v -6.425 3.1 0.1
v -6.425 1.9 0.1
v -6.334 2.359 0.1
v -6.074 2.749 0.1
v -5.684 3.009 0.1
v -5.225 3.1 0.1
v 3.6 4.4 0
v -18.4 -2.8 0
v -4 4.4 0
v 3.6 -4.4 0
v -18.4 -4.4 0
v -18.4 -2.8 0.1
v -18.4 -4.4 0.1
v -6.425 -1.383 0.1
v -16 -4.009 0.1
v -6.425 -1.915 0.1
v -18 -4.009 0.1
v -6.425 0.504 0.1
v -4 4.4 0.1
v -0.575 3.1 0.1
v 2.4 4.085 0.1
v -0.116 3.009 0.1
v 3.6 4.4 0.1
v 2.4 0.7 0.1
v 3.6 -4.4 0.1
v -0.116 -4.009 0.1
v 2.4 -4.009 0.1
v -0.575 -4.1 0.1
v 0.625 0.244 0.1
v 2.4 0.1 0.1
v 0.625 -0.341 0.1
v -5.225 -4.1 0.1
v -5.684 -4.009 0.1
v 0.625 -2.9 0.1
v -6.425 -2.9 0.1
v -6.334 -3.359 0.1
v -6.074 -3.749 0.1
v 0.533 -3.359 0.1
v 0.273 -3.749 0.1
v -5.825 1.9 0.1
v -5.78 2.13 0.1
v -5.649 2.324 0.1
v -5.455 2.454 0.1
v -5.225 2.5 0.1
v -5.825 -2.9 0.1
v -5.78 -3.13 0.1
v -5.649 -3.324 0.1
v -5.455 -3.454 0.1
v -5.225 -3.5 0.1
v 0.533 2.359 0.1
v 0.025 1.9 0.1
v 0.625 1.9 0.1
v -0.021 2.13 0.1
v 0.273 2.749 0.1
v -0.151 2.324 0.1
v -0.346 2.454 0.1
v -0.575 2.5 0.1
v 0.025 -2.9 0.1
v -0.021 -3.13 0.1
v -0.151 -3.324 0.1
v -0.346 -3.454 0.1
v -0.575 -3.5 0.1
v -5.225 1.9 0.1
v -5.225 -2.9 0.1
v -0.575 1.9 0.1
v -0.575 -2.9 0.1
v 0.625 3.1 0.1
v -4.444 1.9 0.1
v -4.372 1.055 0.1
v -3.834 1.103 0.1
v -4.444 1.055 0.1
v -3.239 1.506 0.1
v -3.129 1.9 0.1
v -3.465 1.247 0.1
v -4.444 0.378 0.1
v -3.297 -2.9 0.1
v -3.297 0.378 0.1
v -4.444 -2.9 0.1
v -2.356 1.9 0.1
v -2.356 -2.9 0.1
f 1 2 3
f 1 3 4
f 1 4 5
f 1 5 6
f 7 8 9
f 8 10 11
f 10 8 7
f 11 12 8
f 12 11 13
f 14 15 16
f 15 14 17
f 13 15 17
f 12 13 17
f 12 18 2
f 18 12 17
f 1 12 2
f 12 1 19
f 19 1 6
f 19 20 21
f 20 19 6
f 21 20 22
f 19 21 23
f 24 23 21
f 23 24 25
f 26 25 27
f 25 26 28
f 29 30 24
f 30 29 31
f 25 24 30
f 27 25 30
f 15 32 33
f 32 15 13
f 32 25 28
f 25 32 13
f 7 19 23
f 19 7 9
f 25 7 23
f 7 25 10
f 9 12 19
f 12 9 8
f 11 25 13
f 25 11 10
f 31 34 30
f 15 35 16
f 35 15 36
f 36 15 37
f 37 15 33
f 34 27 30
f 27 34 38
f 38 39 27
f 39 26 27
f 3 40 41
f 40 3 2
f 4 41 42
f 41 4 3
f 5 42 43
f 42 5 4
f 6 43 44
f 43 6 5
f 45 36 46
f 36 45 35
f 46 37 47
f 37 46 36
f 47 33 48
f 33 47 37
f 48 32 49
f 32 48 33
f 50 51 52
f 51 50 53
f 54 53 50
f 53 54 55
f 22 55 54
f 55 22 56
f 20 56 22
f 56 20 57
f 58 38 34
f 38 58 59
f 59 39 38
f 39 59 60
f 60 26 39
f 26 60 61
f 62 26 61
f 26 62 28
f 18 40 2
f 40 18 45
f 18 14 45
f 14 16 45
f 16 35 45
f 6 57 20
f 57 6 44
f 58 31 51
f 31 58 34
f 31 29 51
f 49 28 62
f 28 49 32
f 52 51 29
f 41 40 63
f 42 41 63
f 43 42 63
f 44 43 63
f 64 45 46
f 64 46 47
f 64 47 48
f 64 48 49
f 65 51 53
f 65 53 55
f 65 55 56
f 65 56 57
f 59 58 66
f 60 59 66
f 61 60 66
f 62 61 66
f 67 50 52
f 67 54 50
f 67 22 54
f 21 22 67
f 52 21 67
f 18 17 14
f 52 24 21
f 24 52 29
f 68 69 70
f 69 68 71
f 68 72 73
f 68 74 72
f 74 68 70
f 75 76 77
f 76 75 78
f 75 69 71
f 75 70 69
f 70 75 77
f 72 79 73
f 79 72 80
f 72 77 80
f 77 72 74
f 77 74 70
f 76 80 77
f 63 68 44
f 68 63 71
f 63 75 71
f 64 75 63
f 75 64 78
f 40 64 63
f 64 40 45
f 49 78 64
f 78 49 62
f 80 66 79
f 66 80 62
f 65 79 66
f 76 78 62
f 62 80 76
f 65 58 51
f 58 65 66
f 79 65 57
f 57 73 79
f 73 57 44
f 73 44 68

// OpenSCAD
// file: ../p/1-4ndis.scad
use <../lib.scad>
function ldraw_lib__1_4ndis() = [
// 0 Disc Negative 0.25
// 0 Name: 1-4ndis.dat
// 0 Author: James Jessiman
// 0 !LDRAW_ORG Primitive UPDATE 2012-01
// 0 !LICENSE Licensed under CC BY 2.0 and CC BY 4.0 : see CAreadme.txt
// 
// 0 BFC CERTIFY CCW
  [0,"BFC","CERTIFY"],
  [0,"BFC","CCW"],
// 
// 0 !HISTORY 2002-03-23 [sbliss] Added BFC Statement
// 0 !HISTORY 2002-04-25 [PTadmin] Official Update 2002-02
// 0 !HISTORY 2007-06-22 [PTadmin] Header formatted for Contributor Agreement
// 0 !HISTORY 2008-07-01 [PTadmin] Official Update 2008-01
// 0 !HISTORY 2012-02-16 [Philo] Changed to CCW
// 0 !HISTORY 2012-03-30 [PTadmin] Official Update 2012-01
// 
// 
// 3 16 0.9239 0 0.3827 1 0 0 1 0 1
  [3,16,0.9239,0,0.3827,1,0,0,1,0,1],
// 3 16 0.7071 0 0.7071 0.9239 0 0.3827 1 0 1
  [3,16,0.7071,0,0.7071,0.9239,0,0.3827,1,0,1],
// 3 16 0.3827 0 0.9239 0.7071 0 0.7071 1 0 1
  [3,16,0.3827,0,0.9239,0.7071,0,0.7071,1,0,1],
// 3 16 0 0 1 0.3827 0 0.9239 1 0 1
  [3,16,0,0,1,0.3827,0,0.9239,1,0,1],
];
module ldraw_lib__1_4ndis(step=0, col=false, unit=2/5, alt=false, line=0.2, solid=!$preview)
    makepoly(ldraw_lib__1_4ndis(), step=step, col=col, unit=unit, alt=alt, line=line, solid=solid);
ldraw_lib__1_4ndis(line=0.2);
// file: ../p/3-16ndis.scad
use <../lib.scad>
function ldraw_lib__3_16ndis() = [
// 0 Disc Negative 0.1875
// 0 Name: 3-16ndis.dat
// 0 Author: Guy Vivan [guyvivan]
// 0 !LDRAW_ORG Primitive UPDATE 2009-01
// 0 !LICENSE Licensed under CC BY 2.0 and CC BY 4.0 : see CAreadme.txt
// 
// 0 BFC CERTIFY CCW
  [0,"BFC","CERTIFY"],
  [0,"BFC","CCW"],
// 
// 0 !HISTORY 2009-05-02 [PTadmin] Official Update 2009-01
// 
// 
// 3 16 1 0 1 0.9239 0 0.3827 1 0 0
  [3,16,1,0,1,0.9239,0,0.3827,1,0,0],
// 3 16 1 0 1 0.7071 0 0.7071 0.9239 0 0.3827
  [3,16,1,0,1,0.7071,0,0.7071,0.9239,0,0.3827],
// 3 16 1 0 1 0.3827 0 0.9239 0.7071 0 0.7071
  [3,16,1,0,1,0.3827,0,0.9239,0.7071,0,0.7071],
// 
// 0 end of file
// 
];
module ldraw_lib__3_16ndis(step=0, col=false, unit=2/5, alt=false, line=0.2, solid=!$preview)
    makepoly(ldraw_lib__3_16ndis(), step=step, col=col, unit=unit, alt=alt, line=line, solid=solid);
ldraw_lib__3_16ndis(line=0.2);
// file: ../p/1-4ring1.scad
use <../lib.scad>
function ldraw_lib__1_4ring1() = [
// 0 Ring  1 x 0.25
// 0 Name: 1-4ring1.dat
// 0 Author: Chris Dee [cwdee]
// 0 !LDRAW_ORG Primitive UPDATE 2012-01
// 0 !LICENSE Licensed under CC BY 2.0 and CC BY 4.0 : see CAreadme.txt
// 
// 0 BFC CERTIFY CCW
  [0,"BFC","CERTIFY"],
  [0,"BFC","CCW"],
// 
// 0 !HISTORY 2000-05-07 [PTadmin] Official Update 2000-01
// 0 !HISTORY 2002-11-22 [hafhead] Added BFC statement
// 0 !HISTORY 2002-11-30 [PTadmin] Official Update 2002-05
// 0 !HISTORY 2007-06-22 [PTadmin] Header formatted for Contributor Agreement
// 0 !HISTORY 2008-07-01 [PTadmin] Official Update 2008-01
// 0 !HISTORY 2012-02-16 [Philo] Changed to CCW
// 0 !HISTORY 2012-03-30 [PTadmin] Official Update 2012-01
// 
// 
// 4 16 2 0 0 1.8478 0 0.7654 0.9239 0 0.3827 1 0 0
  [4,16,2,0,0,1.8478,0,0.7654,0.9239,0,0.3827,1,0,0],
// 4 16 1.8478 0 0.7654 1.4142 0 1.4142 0.7071 0 0.7071 0.9239 0 0.3827
  [4,16,1.8478,0,0.7654,1.4142,0,1.4142,0.7071,0,0.7071,0.9239,0,0.3827],
// 4 16 1.4142 0 1.4142 0.7654 0 1.8478 0.3827 0 0.9239 0.7071 0 0.7071
  [4,16,1.4142,0,1.4142,0.7654,0,1.8478,0.3827,0,0.9239,0.7071,0,0.7071],
// 4 16 0.7654 0 1.8478 0 0 2 0 0 1 0.3827 0 0.9239
  [4,16,0.7654,0,1.8478,0,0,2,0,0,1,0.3827,0,0.9239],
];
module ldraw_lib__1_4ring1(step=0, col=false, unit=2/5, alt=false, line=0.2, solid=!$preview)
    makepoly(ldraw_lib__1_4ring1(), step=step, col=col, unit=unit, alt=alt, line=line, solid=solid);
ldraw_lib__1_4ring1(line=0.2);
// file: ../p/1-4disc.scad
use <../lib.scad>
function ldraw_lib__1_4disc() = [
// 0 Disc 0.25
// 0 Name: 1-4disc.dat
// 0 Author: James Jessiman
// 0 !LDRAW_ORG Primitive UPDATE 2002-02
// 0 !LICENSE Licensed under CC BY 2.0 and CC BY 4.0 : see CAreadme.txt
// 
// 0 BFC CERTIFY CCW
  [0,"BFC","CERTIFY"],
  [0,"BFC","CCW"],
// 
// 0 !HISTORY 2002-03-23 [sbliss] Added BFC statement.
// 0 !HISTORY 2002-04-25 [PTadmin] Official Update 2002-02
// 0 !HISTORY 2007-06-22 [PTadmin] Header formatted for Contributor Agreement
// 0 !HISTORY 2008-07-01 [PTadmin] Official Update 2008-01
// 
// 
// 3 16 0 0 0 1 0 0 0.9239 0 0.3827
  [3,16,0,0,0,1,0,0,0.9239,0,0.3827],
// 3 16 0 0 0 0.9239 0 0.3827 0.7071 0 0.7071
  [3,16,0,0,0,0.9239,0,0.3827,0.7071,0,0.7071],
// 3 16 0 0 0 0.7071 0 0.7071 0.3827 0 0.9239
  [3,16,0,0,0,0.7071,0,0.7071,0.3827,0,0.9239],
// 3 16 0 0 0 0.3827 0 0.9239 0 0 1
  [3,16,0,0,0,0.3827,0,0.9239,0,0,1],
// 0
];
module ldraw_lib__1_4disc(step=0, col=false, unit=2/5, alt=false, line=0.2, solid=!$preview)
    makepoly(ldraw_lib__1_4disc(), step=step, col=col, unit=unit, alt=alt, line=line, solid=solid);
ldraw_lib__1_4disc(line=0.2);
// file: ../p/type-swiss721bt-bold-n1.scad
use <../lib.scad>
function ldraw_lib__type_swiss721bt_bold_n1() = [
// 0 Type Swiss721BT Number "1" Bold
// 0 Name: type-swiss721bt-bold-n1.dat
// 0 Author: Ulrich Röder [UR]
// 0 !LDRAW_ORG Primitive UPDATE 2019-01
// 0 !LICENSE Licensed under CC BY 2.0 and CC BY 4.0 : see CAreadme.txt
// 
// 0 BFC CERTIFY CCW
  [0,"BFC","CERTIFY"],
  [0,"BFC","CCW"],
// 
// 0 !HISTORY 2019-06-28 [PTadmin] Official Update 2019-01
// 
// 
// 0 // Main
// 4 16 -.2175 0 .324 -.2025 0 .324 -.0905 0 .334 -.2175 0 .5
  [4,16,-.2175,0,.324,-.2025,0,.324,-.0905,0,.334,-.2175,0,.5],
// 3 16 -.2175 0 .5 .0335 0 .418 .0565 0 .5
  [3,16,-.2175,0,.5,.0335,0,.418,.0565,0,.5],
// 4 16 .0335 0 .418 -.2175 0 .5 -.0905 0 .334 -.0135 0 .364
  [4,16,.0335,0,.418,-.2175,0,.5,-.0905,0,.334,-.0135,0,.364],
// 4 16 .0215 0 .183 -.2175 0 .183 -.2175 0 -.5 .0215 0 -.5
  [4,16,.0215,0,.183,-.2175,0,.183,-.2175,0,-.5,.0215,0,-.5],
// 
// 0 // Black
// 3 0 -.2175 0 .183 -.2025 0 .324 -.2175 0 .324
  [3,0,-.2175,0,.183,-.2025,0,.324,-.2175,0,.324],
// 4 0 .0215 0 .183 -.0905 0 .334 -.2025 0 .324 -.2175 0 .183
  [4,0,.0215,0,.183,-.0905,0,.334,-.2025,0,.324,-.2175,0,.183],
// 4 0 .0335 0 .418 .2175 0 -.5 .2175 0 .5 .0565 0 .5
  [4,0,.0335,0,.418,.2175,0,-.5,.2175,0,.5,.0565,0,.5],
// 4 0 .0215 0 .183 .2175 0 -.5 .0335 0 .418 -.0135 0 .364
  [4,0,.0215,0,.183,.2175,0,-.5,.0335,0,.418,-.0135,0,.364],
// 3 0 .0215 0 .183 -.0135 0 .364 -.0905 0 .334
  [3,0,.0215,0,.183,-.0135,0,.364,-.0905,0,.334],
// 3 0 .0215 0 -.5 .2175 0 -.5 .0215 0 .183
  [3,0,.0215,0,-.5,.2175,0,-.5,.0215,0,.183],
];
module ldraw_lib__type_swiss721bt_bold_n1(step=0, col=false, unit=2/5, alt=false, line=0.2, solid=!$preview)
    makepoly(ldraw_lib__type_swiss721bt_bold_n1(), step=step, col=col, unit=unit, alt=alt, line=line, solid=solid);
ldraw_lib__type_swiss721bt_bold_n1(line=0.2);
// file: s/821435as03.scad
use <../../lib.scad>
use <../../p/1-4ndis.scad>
function ldraw_lib__s__821435as03() = [
// 0 ~Sticker Sloped Body for Racing Number
// 0 Name: s\821435as03.dat
// 0 Author: Ulrich Röder [UR]
// 0 !LDRAW_ORG Subpart UPDATE 2019-01
// 0 !LICENSE Licensed under CC BY 2.0 and CC BY 4.0 : see CAreadme.txt
// 
// 0 BFC CERTIFY CCW
  [0,"BFC","CERTIFY"],
  [0,"BFC","CCW"],
// 
// 0 !HISTORY 2019-06-28 [PTadmin] Official Update 2019-01
// 
// 
// 0 // Main
// 1 16 13.063 -.25 4.75 3 0 0 0 1 0 0 0 3 1-4ndis.dat
  [1,16,13.063,-.25,4.75,3,0,0,0,1,0,0,0,3, ldraw_lib__1_4ndis()],
// 3 16 10 0 11 46 0 -7 -9 0 11
  [3,16,10,0,11,46,0,-7,-9,0,11],
// 4 16 -9 0 -11 -9 0 11 46 0 -7 46 0 -11
  [4,16,-9,0,-11,-9,0,11,46,0,-7,46,0,-11],
// 4 16 46 -.25 -11 46 0 -11 46 0 -7 46 -.25 -7
  [4,16,46,-.25,-11,46,0,-11,46,0,-7,46,-.25,-7],
// 4 16 16.063 -.25 -4.788 40 -.25 -10.022 45 -.25 -10.022 16.063 -.25 -3.458
  [4,16,16.063,-.25,-4.788,40,-.25,-10.022,45,-.25,-10.022,16.063,-.25,-3.458],
// 3 16 45 -.25 -10.022 40 -.25 -10.022 46 -.25 -11
  [3,16,45,-.25,-10.022,40,-.25,-10.022,46,-.25,-11],
// 3 16 45 -.25 -10.022 46 -.25 -11 46 -.25 -7
  [3,16,45,-.25,-10.022,46,-.25,-11,46,-.25,-7],
// 4 16 16.063 -.25 4.75 16.063 -.25 1.261 45 -.25 -10.022 46 -.25 -7
  [4,16,16.063,-.25,4.75,16.063,-.25,1.261,45,-.25,-10.022,46,-.25,-7],
// 3 16 16.063 -.25 4.75 46 -.25 -7 16.063 -.25 7.75
  [3,16,16.063,-.25,4.75,46,-.25,-7,16.063,-.25,7.75],
// 3 16 10 -.25 11 16.063 -.25 7.75 46 -.25 -7
  [3,16,10,-.25,11,16.063,-.25,7.75,46,-.25,-7],
// 3 16 13.063 -.25 7.75 16.063 -.25 7.75 10 -.25 11
  [3,16,13.063,-.25,7.75,16.063,-.25,7.75,10,-.25,11],
// 4 16 -6 -.25 10.213 1.438 -.25 7.75 13.063 -.25 7.75 10 -.25 11
  [4,16,-6,-.25,10.213,1.438,-.25,7.75,13.063,-.25,7.75,10,-.25,11],
// 3 16 .2899 -.25 7.5217 1.438 -.25 7.75 -6 -.25 10.213
  [3,16,.2899,-.25,7.5217,1.438,-.25,7.75,-6,-.25,10.213],
// 3 16 -9 -.25 11 -6 -.25 10.213 10 -.25 11
  [3,16,-9,-.25,11,-6,-.25,10.213,10,-.25,11],
// 4 16 -9 -.25 -11 -6 -.25 1.75 -6 -.25 10.213 -9 -.25 11
  [4,16,-9,-.25,-11,-6,-.25,1.75,-6,-.25,10.213,-9,-.25,11],
// 4 16 1.438 -.25 -10.25 .2899 -.25 -10.0217 -6 -.25 -10.022 -9 -.25 -11
  [4,16,1.438,-.25,-10.25,.2899,-.25,-10.0217,-6,-.25,-10.022,-9,-.25,-11],
// 4 16 -1.563 -.25 .61 -6 -.25 1.75 -6 -.25 .25 -1.563 -.25 -.853
  [4,16,-1.563,-.25,.61,-6,-.25,1.75,-6,-.25,.25,-1.563,-.25,-.853],
// 3 16 -6 -.25 .25 -6 -.25 1.75 -9 -.25 -11
  [3,16,-6,-.25,.25,-6,-.25,1.75,-9,-.25,-11],
// 3 16 -6 -.25 .25 -9 -.25 -11 -6 -.25 -10.022
  [3,16,-6,-.25,.25,-9,-.25,-11,-6,-.25,-10.022],
// 4 16 40 -.25 -10.022 14.2111 -.25 -10.0217 13.063 -.25 -10.25 46 -.25 -11
  [4,16,40,-.25,-10.022,14.2111,-.25,-10.0217,13.063,-.25,-10.25,46,-.25,-11],
// 4 16 1.438 -.25 -10.25 -9 -.25 -11 46 -.25 -11 13.063 -.25 -10.25
  [4,16,1.438,-.25,-10.25,-9,-.25,-11,46,-.25,-11,13.063,-.25,-10.25],
// 4 16 -9 -.25 11 10 -.25 11 10 0 11 -9 0 11
  [4,16,-9,-.25,11,10,-.25,11,10,0,11,-9,0,11],
// 4 16 -9 0 11 -9 0 -11 -9 -.25 -11 -9 -.25 11
  [4,16,-9,0,11,-9,0,-11,-9,-.25,-11,-9,-.25,11],
// 4 16 10 -.25 11 46 -.25 -7 46 0 -7 10 0 11
  [4,16,10,-.25,11,46,-.25,-7,46,0,-7,10,0,11],
// 4 16 46 0 -11 46 -.25 -11 -9 -.25 -11 -9 0 -11
  [4,16,46,0,-11,46,-.25,-11,-9,-.25,-11,-9,0,-11],
];
module ldraw_lib__s__821435as03(step=0, col=false, unit=2/5, alt=false, line=0.2, solid=!$preview)
    makepoly(ldraw_lib__s__821435as03(), step=step, col=col, unit=unit, alt=alt, line=line, solid=solid);
ldraw_lib__s__821435as03(line=0.2);
// file: s/821435as02.scad
use <../../lib.scad>
use <../../p/3-16ndis.scad>
function ldraw_lib__s__821435as02() = [
// 0 ~Sticker Upper Triangle with Cutout for Racing Number
// 0 Name: s\821435as02.dat
// 0 Author: Ulrich Röder [UR]
// 0 !LDRAW_ORG Subpart UPDATE 2019-01
// 0 !LICENSE Licensed under CC BY 2.0 and CC BY 4.0 : see CAreadme.txt
// 
// 0 BFC CERTIFY CCW
  [0,"BFC","CERTIFY"],
  [0,"BFC","CCW"],
// 
// 0 !HISTORY 2019-06-28 [PTadmin] Official Update 2019-01
// 
// 
// 0 // Main
// 1 16 1.438 -.25 4.75 -3 0 0 0 1 0 0 0 3 3-16ndis.dat
  [1,16,1.438,-.25,4.75,-3,0,0,0,1,0,0,0,3, ldraw_lib__3_16ndis()],
// 3 16 -1.562 -.25 7.75 .2899 -.25 7.5217 -6 -.25 10.213
  [3,16,-1.562,-.25,7.75,.2899,-.25,7.5217,-6,-.25,10.213],
// 3 16 -1.562 -.25 7.75 -6 -.25 10.213 -1.562 -.25 4.75
  [3,16,-1.562,-.25,7.75,-6,-.25,10.213,-1.562,-.25,4.75],
// 3 16 16.063 -.25 -3.458 45 -.25 -10.022 16.063 -.25 1.261
  [3,16,16.063,-.25,-3.458,45,-.25,-10.022,16.063,-.25,1.261],
// 4 16 -6 -.25 1.75 -1.563 -.25 .61 -1.562 -.25 4.75 -6 -.25 10.213
  [4,16,-6,-.25,1.75,-1.563,-.25,.61,-1.562,-.25,4.75,-6,-.25,10.213],
];
module ldraw_lib__s__821435as02(step=0, col=false, unit=2/5, alt=false, line=0.2, solid=!$preview)
    makepoly(ldraw_lib__s__821435as02(), step=step, col=col, unit=unit, alt=alt, line=line, solid=solid);
ldraw_lib__s__821435as02(line=0.2);
// file: s/821435as01.scad
use <../../lib.scad>
use <../../p/1-4disc.scad>
use <../../p/1-4ring1.scad>
function ldraw_lib__s__821435as01() = [
// 0 ~Sticker Lower Triangle and Racing Number Frame
// 0 Name: s\821435as01.dat
// 0 Author: Ulrich Röder [UR]
// 0 !LDRAW_ORG Subpart UPDATE 2019-01
// 0 !LICENSE Licensed under CC BY 2.0 and CC BY 4.0 : see CAreadme.txt
// 
// 0 BFC CERTIFY CCW
  [0,"BFC","CERTIFY"],
  [0,"BFC","CCW"],
// 
// 0 !HISTORY 2019-06-28 [PTadmin] Official Update 2019-01
// 
// 
// 0 // Main
// 
// 3 16 -6 -0.25 0.25 -1.562 -0.25 -7.25 -1.563 -0.25 -0.853
  [3,16,-6,-0.25,0.25,-1.562,-0.25,-7.25,-1.563,-0.25,-0.853],
// 3 16 16.063 -0.25 -4.788 16.063 -0.25 -7.25 40 -0.25 -10.022
  [3,16,16.063,-0.25,-4.788,16.063,-0.25,-7.25,40,-0.25,-10.022],
// 3 16 15.8347 -0.25 -8.3981 40 -0.25 -10.022 16.063 -0.25 -7.25
  [3,16,15.8347,-0.25,-8.3981,40,-0.25,-10.022,16.063,-0.25,-7.25],
// 3 16 15.1843 -0.25 -9.3713 40 -0.25 -10.022 15.8347 -0.25 -8.3981
  [3,16,15.1843,-0.25,-9.3713,40,-0.25,-10.022,15.8347,-0.25,-8.3981],
// 3 16 14.2111 -0.25 -10.0217 40 -0.25 -10.022 15.1843 -0.25 -9.3713
  [3,16,14.2111,-0.25,-10.0217,40,-0.25,-10.022,15.1843,-0.25,-9.3713],
// 4 16 -6 -0.25 0.25 -6 -0.25 -10.022 -1.3337 -0.25 -8.3981 -1.562 -0.25 -7.25
  [4,16,-6,-0.25,0.25,-6,-0.25,-10.022,-1.3337,-0.25,-8.3981,-1.562,-0.25,-7.25],
// 3 16 -6 -0.25 -10.022 -0.6833 -0.25 -9.3713 -1.3337 -0.25 -8.3981
  [3,16,-6,-0.25,-10.022,-0.6833,-0.25,-9.3713,-1.3337,-0.25,-8.3981],
// 3 16 -6 -0.25 -10.022 0.2899 -0.25 -10.0217 -0.6833 -0.25 -9.3713
  [3,16,-6,-0.25,-10.022,0.2899,-0.25,-10.0217,-0.6833,-0.25,-9.3713],
// 
// 0 // Black
// 1 0 13.063 -.25 4.75 1.5 0 0 0 1 0 0 0 1.5 1-4ring1.dat
  [1,0,13.063,-.25,4.75,1.5,0,0,0,1,0,0,0,1.5, ldraw_lib__1_4ring1()],
// 1 0 13.063 -.25 -7.25 1.5 0 0 0 1 0 0 0 -1.5 1-4ring1.dat
  [1,0,13.063,-.25,-7.25,1.5,0,0,0,1,0,0,0,-1.5, ldraw_lib__1_4ring1()],
// 1 0 1.438 -.25 4.75 -1.5 0 0 0 1 0 0 0 1.5 1-4ring1.dat
  [1,0,1.438,-.25,4.75,-1.5,0,0,0,1,0,0,0,1.5, ldraw_lib__1_4ring1()],
// 1 0 1.438 -.25 -7.25 -1.5 0 0 0 1 0 0 0 -1.5 1-4ring1.dat
  [1,0,1.438,-.25,-7.25,-1.5,0,0,0,1,0,0,0,-1.5, ldraw_lib__1_4ring1()],
// 4 0 14.563 -0.25 4.75 14.563 -0.25 -7.25 16.063 -0.25 1.261 16.063 -0.25 4.75
  [4,0,14.563,-0.25,4.75,14.563,-0.25,-7.25,16.063,-0.25,1.261,16.063,-0.25,4.75],
// 3 0 14.563 -0.25 -7.25 16.063 -0.25 -3.458 16.063 -0.25 1.261
  [3,0,14.563,-0.25,-7.25,16.063,-0.25,-3.458,16.063,-0.25,1.261],
// 3 0 14.563 -0.25 -7.25 16.063 -0.25 -4.788 16.063 -0.25 -3.458
  [3,0,14.563,-0.25,-7.25,16.063,-0.25,-4.788,16.063,-0.25,-3.458],
// 3 0 14.563 -0.25 -7.25 16.063 -0.25 -7.25 16.063 -0.25 -4.788
  [3,0,14.563,-0.25,-7.25,16.063,-0.25,-7.25,16.063,-0.25,-4.788],
// 4 0 13.063 -0.25 6.25 13.063 -0.25 7.75 1.438 -0.25 7.75 1.438 -0.25 6.25
  [4,0,13.063,-0.25,6.25,13.063,-0.25,7.75,1.438,-0.25,7.75,1.438,-0.25,6.25],
// 4 0 -0.062 -0.25 4.75 -1.563 -0.25 -0.853 -1.562 -0.25 -7.25 -0.062 -0.25 -7.25
  [4,0,-0.062,-0.25,4.75,-1.563,-0.25,-0.853,-1.562,-0.25,-7.25,-0.062,-0.25,-7.25],
// 3 0 -0.062 -0.25 4.75 -1.563 -0.25 0.61 -1.563 -0.25 -0.853
  [3,0,-0.062,-0.25,4.75,-1.563,-0.25,0.61,-1.563,-0.25,-0.853],
// 4 0 1.438 -0.25 -10.25 13.063 -0.25 -10.25 13.063 -0.25 -8.75 1.438 -0.25 -8.75
  [4,0,1.438,-0.25,-10.25,13.063,-0.25,-10.25,13.063,-0.25,-8.75,1.438,-0.25,-8.75],
// 3 0 -1.563 -0.25 0.61 -0.062 -0.25 4.75 -1.562 -0.25 4.75
  [3,0,-1.563,-0.25,0.61,-0.062,-0.25,4.75,-1.562,-0.25,4.75],
// 
// 0 // White
// 1 15 13.063 -.25 4.75 1.5 0 0 0 1 0 0 0 1.5 1-4disc.dat
  [1,15,13.063,-.25,4.75,1.5,0,0,0,1,0,0,0,1.5, ldraw_lib__1_4disc()],
// 1 15 13.063 -.25 -7.25 1.5 0 0 0 1 0 0 0 -1.5 1-4disc.dat
  [1,15,13.063,-.25,-7.25,1.5,0,0,0,1,0,0,0,-1.5, ldraw_lib__1_4disc()],
// 1 15 1.438 -.25 4.75 -1.5 0 0 0 1 0 0 0 1.5 1-4disc.dat
  [1,15,1.438,-.25,4.75,-1.5,0,0,0,1,0,0,0,1.5, ldraw_lib__1_4disc()],
// 1 15 1.438 -.25 -7.25 -1.5 0 0 0 1 0 0 0 -1.5 1-4disc.dat
  [1,15,1.438,-.25,-7.25,-1.5,0,0,0,1,0,0,0,-1.5, ldraw_lib__1_4disc()],
];
module ldraw_lib__s__821435as01(step=0, col=false, unit=2/5, alt=false, line=0.2, solid=!$preview)
    makepoly(ldraw_lib__s__821435as01(), step=step, col=col, unit=unit, alt=alt, line=line, solid=solid);
ldraw_lib__s__821435as01(line=0.2);
// main file
use <../lib.scad>
use <s/821435as01.scad>
use <s/821435as02.scad>
use <s/821435as03.scad>
use <../p/type-swiss721bt-bold-n1.scad>
function ldraw_lib__821435b() = [
// 0 Sticker with Red/Green Triangles and Racing Number "1", Left
// 0 Name: 821435b.dat
// 0 Author: Ulrich Röder [UR]
// 0 !LDRAW_ORG Part UPDATE 2019-01
// 0 !LICENSE Licensed under CC BY 2.0 and CC BY 4.0 : see CAreadme.txt
// 
// 0 BFC CERTIFY CCW
  [0,"BFC","CERTIFY"],
  [0,"BFC","CCW"],
// 
// 0 !KEYWORDS cup, Racers, Set 6539
// 
// 0 !HISTORY 2019-06-28 [PTadmin] Official Update 2019-01
// 
// 
// 0 // Main
// 1 16 0 0 0 -1 0 0 0 1 0 0 0 1 s\821435as03.dat
  [1,16,0,0,0,-1,0,0,0,1,0,0,0,1, ldraw_lib__s__821435as03()],
// 
// 0 // Green
// 1 2 0 0 0 -1 0 0 0 1 0 0 0 1 s\821435as01.dat
  [1,2,0,0,0,-1,0,0,0,1,0,0,0,1, ldraw_lib__s__821435as01()],
// 
// 0 // Red
// 1 4 0 0 0 -1 0 0 0 1 0 0 0 1 s\821435as02.dat
  [1,4,0,0,0,-1,0,0,0,1,0,0,0,1, ldraw_lib__s__821435as02()],
// 
// 0 // White
// 1 15 -8.5 -.25 -1.25 12 0 0 0 1 0 0 0 12 type-swiss721bt-bold-n1.dat
  [1,15,-8.5,-.25,-1.25,12,0,0,0,1,0,0,0,12, ldraw_lib__type_swiss721bt_bold_n1()],
// 4 15 -11.11 -.25 2.638 -11.11 -.25 4.75 -13.063 -.25 6.25 -13.063 -.25 4.75
  [4,15,-11.11,-.25,2.638,-11.11,-.25,4.75,-13.063,-.25,6.25,-13.063,-.25,4.75],
// 3 15 -13.063 -.25 4.75 -11.11 -.25 .946 -11.11 -.25 2.638
  [3,15,-13.063,-.25,4.75,-11.11,-.25,.946,-11.11,-.25,2.638],
// 4 15 -13.063 -.25 -7.25 -11.11 -.25 -7.25 -11.11 -.25 .946 -13.063 -.25 4.75
  [4,15,-13.063,-.25,-7.25,-11.11,-.25,-7.25,-11.11,-.25,.946,-13.063,-.25,4.75],
// 4 15 -14.563 -.25 -7.25 -13.063 -.25 -7.25 -13.063 -.25 4.75 -14.563 -.25 4.75
  [4,15,-14.563,-.25,-7.25,-13.063,-.25,-7.25,-13.063,-.25,4.75,-14.563,-.25,4.75],
// 4 15 -13.063 -.25 -8.75 -1.438 -.25 -8.75 -11.11 -.25 -7.25 -13.063 -.25 -7.25
  [4,15,-13.063,-.25,-8.75,-1.438,-.25,-8.75,-11.11,-.25,-7.25,-13.063,-.25,-7.25],
// 4 15 -5.89 -.25 -7.25 -1.438 -.25 -8.75 -1.438 -.25 -7.25 -5.89 -.25 4.75
  [4,15,-5.89,-.25,-7.25,-1.438,-.25,-8.75,-1.438,-.25,-7.25,-5.89,-.25,4.75],
// 3 15 -1.438 -.25 4.75 -5.89 -.25 4.75 -1.438 -.25 -7.25
  [3,15,-1.438,-.25,4.75,-5.89,-.25,4.75,-1.438,-.25,-7.25],
// 3 15 -8.242 -.25 -7.25 -11.11 -.25 -7.25 -1.438 -.25 -8.75
  [3,15,-8.242,-.25,-7.25,-11.11,-.25,-7.25,-1.438,-.25,-8.75],
// 3 15 -1.438 -.25 -8.75 -5.89 -.25 -7.25 -8.242 -.25 -7.25
  [3,15,-1.438,-.25,-8.75,-5.89,-.25,-7.25,-8.242,-.25,-7.25],
// 4 15 .062 -.25 4.75 -1.438 -.25 4.75 -1.438 -.25 -7.25 .062 -.25 -7.25
  [4,15,.062,-.25,4.75,-1.438,-.25,4.75,-1.438,-.25,-7.25,.062,-.25,-7.25],
// 3 15 -5.89 -.25 4.75 -1.438 -.25 4.75 -1.438 -.25 6.25
  [3,15,-5.89,-.25,4.75,-1.438,-.25,4.75,-1.438,-.25,6.25],
// 4 15 -1.438 -.25 6.25 -13.063 -.25 6.25 -7.822 -.25 4.75 -5.89 -.25 4.75
  [4,15,-1.438,-.25,6.25,-13.063,-.25,6.25,-7.822,-.25,4.75,-5.89,-.25,4.75],
// 3 15 -7.822 -.25 4.75 -13.063 -.25 6.25 -11.11 -.25 4.75
  [3,15,-7.822,-.25,4.75,-13.063,-.25,6.25,-11.11,-.25,4.75],
];
module ldraw_lib__821435b(step=0, col=false, unit=2/5, alt=false, line=0.2, solid=!$preview)
    makepoly(ldraw_lib__821435b(), step=step, col=col, unit=unit, alt=alt, line=line, solid=solid);
ldraw_lib__821435b(line=0.2);
